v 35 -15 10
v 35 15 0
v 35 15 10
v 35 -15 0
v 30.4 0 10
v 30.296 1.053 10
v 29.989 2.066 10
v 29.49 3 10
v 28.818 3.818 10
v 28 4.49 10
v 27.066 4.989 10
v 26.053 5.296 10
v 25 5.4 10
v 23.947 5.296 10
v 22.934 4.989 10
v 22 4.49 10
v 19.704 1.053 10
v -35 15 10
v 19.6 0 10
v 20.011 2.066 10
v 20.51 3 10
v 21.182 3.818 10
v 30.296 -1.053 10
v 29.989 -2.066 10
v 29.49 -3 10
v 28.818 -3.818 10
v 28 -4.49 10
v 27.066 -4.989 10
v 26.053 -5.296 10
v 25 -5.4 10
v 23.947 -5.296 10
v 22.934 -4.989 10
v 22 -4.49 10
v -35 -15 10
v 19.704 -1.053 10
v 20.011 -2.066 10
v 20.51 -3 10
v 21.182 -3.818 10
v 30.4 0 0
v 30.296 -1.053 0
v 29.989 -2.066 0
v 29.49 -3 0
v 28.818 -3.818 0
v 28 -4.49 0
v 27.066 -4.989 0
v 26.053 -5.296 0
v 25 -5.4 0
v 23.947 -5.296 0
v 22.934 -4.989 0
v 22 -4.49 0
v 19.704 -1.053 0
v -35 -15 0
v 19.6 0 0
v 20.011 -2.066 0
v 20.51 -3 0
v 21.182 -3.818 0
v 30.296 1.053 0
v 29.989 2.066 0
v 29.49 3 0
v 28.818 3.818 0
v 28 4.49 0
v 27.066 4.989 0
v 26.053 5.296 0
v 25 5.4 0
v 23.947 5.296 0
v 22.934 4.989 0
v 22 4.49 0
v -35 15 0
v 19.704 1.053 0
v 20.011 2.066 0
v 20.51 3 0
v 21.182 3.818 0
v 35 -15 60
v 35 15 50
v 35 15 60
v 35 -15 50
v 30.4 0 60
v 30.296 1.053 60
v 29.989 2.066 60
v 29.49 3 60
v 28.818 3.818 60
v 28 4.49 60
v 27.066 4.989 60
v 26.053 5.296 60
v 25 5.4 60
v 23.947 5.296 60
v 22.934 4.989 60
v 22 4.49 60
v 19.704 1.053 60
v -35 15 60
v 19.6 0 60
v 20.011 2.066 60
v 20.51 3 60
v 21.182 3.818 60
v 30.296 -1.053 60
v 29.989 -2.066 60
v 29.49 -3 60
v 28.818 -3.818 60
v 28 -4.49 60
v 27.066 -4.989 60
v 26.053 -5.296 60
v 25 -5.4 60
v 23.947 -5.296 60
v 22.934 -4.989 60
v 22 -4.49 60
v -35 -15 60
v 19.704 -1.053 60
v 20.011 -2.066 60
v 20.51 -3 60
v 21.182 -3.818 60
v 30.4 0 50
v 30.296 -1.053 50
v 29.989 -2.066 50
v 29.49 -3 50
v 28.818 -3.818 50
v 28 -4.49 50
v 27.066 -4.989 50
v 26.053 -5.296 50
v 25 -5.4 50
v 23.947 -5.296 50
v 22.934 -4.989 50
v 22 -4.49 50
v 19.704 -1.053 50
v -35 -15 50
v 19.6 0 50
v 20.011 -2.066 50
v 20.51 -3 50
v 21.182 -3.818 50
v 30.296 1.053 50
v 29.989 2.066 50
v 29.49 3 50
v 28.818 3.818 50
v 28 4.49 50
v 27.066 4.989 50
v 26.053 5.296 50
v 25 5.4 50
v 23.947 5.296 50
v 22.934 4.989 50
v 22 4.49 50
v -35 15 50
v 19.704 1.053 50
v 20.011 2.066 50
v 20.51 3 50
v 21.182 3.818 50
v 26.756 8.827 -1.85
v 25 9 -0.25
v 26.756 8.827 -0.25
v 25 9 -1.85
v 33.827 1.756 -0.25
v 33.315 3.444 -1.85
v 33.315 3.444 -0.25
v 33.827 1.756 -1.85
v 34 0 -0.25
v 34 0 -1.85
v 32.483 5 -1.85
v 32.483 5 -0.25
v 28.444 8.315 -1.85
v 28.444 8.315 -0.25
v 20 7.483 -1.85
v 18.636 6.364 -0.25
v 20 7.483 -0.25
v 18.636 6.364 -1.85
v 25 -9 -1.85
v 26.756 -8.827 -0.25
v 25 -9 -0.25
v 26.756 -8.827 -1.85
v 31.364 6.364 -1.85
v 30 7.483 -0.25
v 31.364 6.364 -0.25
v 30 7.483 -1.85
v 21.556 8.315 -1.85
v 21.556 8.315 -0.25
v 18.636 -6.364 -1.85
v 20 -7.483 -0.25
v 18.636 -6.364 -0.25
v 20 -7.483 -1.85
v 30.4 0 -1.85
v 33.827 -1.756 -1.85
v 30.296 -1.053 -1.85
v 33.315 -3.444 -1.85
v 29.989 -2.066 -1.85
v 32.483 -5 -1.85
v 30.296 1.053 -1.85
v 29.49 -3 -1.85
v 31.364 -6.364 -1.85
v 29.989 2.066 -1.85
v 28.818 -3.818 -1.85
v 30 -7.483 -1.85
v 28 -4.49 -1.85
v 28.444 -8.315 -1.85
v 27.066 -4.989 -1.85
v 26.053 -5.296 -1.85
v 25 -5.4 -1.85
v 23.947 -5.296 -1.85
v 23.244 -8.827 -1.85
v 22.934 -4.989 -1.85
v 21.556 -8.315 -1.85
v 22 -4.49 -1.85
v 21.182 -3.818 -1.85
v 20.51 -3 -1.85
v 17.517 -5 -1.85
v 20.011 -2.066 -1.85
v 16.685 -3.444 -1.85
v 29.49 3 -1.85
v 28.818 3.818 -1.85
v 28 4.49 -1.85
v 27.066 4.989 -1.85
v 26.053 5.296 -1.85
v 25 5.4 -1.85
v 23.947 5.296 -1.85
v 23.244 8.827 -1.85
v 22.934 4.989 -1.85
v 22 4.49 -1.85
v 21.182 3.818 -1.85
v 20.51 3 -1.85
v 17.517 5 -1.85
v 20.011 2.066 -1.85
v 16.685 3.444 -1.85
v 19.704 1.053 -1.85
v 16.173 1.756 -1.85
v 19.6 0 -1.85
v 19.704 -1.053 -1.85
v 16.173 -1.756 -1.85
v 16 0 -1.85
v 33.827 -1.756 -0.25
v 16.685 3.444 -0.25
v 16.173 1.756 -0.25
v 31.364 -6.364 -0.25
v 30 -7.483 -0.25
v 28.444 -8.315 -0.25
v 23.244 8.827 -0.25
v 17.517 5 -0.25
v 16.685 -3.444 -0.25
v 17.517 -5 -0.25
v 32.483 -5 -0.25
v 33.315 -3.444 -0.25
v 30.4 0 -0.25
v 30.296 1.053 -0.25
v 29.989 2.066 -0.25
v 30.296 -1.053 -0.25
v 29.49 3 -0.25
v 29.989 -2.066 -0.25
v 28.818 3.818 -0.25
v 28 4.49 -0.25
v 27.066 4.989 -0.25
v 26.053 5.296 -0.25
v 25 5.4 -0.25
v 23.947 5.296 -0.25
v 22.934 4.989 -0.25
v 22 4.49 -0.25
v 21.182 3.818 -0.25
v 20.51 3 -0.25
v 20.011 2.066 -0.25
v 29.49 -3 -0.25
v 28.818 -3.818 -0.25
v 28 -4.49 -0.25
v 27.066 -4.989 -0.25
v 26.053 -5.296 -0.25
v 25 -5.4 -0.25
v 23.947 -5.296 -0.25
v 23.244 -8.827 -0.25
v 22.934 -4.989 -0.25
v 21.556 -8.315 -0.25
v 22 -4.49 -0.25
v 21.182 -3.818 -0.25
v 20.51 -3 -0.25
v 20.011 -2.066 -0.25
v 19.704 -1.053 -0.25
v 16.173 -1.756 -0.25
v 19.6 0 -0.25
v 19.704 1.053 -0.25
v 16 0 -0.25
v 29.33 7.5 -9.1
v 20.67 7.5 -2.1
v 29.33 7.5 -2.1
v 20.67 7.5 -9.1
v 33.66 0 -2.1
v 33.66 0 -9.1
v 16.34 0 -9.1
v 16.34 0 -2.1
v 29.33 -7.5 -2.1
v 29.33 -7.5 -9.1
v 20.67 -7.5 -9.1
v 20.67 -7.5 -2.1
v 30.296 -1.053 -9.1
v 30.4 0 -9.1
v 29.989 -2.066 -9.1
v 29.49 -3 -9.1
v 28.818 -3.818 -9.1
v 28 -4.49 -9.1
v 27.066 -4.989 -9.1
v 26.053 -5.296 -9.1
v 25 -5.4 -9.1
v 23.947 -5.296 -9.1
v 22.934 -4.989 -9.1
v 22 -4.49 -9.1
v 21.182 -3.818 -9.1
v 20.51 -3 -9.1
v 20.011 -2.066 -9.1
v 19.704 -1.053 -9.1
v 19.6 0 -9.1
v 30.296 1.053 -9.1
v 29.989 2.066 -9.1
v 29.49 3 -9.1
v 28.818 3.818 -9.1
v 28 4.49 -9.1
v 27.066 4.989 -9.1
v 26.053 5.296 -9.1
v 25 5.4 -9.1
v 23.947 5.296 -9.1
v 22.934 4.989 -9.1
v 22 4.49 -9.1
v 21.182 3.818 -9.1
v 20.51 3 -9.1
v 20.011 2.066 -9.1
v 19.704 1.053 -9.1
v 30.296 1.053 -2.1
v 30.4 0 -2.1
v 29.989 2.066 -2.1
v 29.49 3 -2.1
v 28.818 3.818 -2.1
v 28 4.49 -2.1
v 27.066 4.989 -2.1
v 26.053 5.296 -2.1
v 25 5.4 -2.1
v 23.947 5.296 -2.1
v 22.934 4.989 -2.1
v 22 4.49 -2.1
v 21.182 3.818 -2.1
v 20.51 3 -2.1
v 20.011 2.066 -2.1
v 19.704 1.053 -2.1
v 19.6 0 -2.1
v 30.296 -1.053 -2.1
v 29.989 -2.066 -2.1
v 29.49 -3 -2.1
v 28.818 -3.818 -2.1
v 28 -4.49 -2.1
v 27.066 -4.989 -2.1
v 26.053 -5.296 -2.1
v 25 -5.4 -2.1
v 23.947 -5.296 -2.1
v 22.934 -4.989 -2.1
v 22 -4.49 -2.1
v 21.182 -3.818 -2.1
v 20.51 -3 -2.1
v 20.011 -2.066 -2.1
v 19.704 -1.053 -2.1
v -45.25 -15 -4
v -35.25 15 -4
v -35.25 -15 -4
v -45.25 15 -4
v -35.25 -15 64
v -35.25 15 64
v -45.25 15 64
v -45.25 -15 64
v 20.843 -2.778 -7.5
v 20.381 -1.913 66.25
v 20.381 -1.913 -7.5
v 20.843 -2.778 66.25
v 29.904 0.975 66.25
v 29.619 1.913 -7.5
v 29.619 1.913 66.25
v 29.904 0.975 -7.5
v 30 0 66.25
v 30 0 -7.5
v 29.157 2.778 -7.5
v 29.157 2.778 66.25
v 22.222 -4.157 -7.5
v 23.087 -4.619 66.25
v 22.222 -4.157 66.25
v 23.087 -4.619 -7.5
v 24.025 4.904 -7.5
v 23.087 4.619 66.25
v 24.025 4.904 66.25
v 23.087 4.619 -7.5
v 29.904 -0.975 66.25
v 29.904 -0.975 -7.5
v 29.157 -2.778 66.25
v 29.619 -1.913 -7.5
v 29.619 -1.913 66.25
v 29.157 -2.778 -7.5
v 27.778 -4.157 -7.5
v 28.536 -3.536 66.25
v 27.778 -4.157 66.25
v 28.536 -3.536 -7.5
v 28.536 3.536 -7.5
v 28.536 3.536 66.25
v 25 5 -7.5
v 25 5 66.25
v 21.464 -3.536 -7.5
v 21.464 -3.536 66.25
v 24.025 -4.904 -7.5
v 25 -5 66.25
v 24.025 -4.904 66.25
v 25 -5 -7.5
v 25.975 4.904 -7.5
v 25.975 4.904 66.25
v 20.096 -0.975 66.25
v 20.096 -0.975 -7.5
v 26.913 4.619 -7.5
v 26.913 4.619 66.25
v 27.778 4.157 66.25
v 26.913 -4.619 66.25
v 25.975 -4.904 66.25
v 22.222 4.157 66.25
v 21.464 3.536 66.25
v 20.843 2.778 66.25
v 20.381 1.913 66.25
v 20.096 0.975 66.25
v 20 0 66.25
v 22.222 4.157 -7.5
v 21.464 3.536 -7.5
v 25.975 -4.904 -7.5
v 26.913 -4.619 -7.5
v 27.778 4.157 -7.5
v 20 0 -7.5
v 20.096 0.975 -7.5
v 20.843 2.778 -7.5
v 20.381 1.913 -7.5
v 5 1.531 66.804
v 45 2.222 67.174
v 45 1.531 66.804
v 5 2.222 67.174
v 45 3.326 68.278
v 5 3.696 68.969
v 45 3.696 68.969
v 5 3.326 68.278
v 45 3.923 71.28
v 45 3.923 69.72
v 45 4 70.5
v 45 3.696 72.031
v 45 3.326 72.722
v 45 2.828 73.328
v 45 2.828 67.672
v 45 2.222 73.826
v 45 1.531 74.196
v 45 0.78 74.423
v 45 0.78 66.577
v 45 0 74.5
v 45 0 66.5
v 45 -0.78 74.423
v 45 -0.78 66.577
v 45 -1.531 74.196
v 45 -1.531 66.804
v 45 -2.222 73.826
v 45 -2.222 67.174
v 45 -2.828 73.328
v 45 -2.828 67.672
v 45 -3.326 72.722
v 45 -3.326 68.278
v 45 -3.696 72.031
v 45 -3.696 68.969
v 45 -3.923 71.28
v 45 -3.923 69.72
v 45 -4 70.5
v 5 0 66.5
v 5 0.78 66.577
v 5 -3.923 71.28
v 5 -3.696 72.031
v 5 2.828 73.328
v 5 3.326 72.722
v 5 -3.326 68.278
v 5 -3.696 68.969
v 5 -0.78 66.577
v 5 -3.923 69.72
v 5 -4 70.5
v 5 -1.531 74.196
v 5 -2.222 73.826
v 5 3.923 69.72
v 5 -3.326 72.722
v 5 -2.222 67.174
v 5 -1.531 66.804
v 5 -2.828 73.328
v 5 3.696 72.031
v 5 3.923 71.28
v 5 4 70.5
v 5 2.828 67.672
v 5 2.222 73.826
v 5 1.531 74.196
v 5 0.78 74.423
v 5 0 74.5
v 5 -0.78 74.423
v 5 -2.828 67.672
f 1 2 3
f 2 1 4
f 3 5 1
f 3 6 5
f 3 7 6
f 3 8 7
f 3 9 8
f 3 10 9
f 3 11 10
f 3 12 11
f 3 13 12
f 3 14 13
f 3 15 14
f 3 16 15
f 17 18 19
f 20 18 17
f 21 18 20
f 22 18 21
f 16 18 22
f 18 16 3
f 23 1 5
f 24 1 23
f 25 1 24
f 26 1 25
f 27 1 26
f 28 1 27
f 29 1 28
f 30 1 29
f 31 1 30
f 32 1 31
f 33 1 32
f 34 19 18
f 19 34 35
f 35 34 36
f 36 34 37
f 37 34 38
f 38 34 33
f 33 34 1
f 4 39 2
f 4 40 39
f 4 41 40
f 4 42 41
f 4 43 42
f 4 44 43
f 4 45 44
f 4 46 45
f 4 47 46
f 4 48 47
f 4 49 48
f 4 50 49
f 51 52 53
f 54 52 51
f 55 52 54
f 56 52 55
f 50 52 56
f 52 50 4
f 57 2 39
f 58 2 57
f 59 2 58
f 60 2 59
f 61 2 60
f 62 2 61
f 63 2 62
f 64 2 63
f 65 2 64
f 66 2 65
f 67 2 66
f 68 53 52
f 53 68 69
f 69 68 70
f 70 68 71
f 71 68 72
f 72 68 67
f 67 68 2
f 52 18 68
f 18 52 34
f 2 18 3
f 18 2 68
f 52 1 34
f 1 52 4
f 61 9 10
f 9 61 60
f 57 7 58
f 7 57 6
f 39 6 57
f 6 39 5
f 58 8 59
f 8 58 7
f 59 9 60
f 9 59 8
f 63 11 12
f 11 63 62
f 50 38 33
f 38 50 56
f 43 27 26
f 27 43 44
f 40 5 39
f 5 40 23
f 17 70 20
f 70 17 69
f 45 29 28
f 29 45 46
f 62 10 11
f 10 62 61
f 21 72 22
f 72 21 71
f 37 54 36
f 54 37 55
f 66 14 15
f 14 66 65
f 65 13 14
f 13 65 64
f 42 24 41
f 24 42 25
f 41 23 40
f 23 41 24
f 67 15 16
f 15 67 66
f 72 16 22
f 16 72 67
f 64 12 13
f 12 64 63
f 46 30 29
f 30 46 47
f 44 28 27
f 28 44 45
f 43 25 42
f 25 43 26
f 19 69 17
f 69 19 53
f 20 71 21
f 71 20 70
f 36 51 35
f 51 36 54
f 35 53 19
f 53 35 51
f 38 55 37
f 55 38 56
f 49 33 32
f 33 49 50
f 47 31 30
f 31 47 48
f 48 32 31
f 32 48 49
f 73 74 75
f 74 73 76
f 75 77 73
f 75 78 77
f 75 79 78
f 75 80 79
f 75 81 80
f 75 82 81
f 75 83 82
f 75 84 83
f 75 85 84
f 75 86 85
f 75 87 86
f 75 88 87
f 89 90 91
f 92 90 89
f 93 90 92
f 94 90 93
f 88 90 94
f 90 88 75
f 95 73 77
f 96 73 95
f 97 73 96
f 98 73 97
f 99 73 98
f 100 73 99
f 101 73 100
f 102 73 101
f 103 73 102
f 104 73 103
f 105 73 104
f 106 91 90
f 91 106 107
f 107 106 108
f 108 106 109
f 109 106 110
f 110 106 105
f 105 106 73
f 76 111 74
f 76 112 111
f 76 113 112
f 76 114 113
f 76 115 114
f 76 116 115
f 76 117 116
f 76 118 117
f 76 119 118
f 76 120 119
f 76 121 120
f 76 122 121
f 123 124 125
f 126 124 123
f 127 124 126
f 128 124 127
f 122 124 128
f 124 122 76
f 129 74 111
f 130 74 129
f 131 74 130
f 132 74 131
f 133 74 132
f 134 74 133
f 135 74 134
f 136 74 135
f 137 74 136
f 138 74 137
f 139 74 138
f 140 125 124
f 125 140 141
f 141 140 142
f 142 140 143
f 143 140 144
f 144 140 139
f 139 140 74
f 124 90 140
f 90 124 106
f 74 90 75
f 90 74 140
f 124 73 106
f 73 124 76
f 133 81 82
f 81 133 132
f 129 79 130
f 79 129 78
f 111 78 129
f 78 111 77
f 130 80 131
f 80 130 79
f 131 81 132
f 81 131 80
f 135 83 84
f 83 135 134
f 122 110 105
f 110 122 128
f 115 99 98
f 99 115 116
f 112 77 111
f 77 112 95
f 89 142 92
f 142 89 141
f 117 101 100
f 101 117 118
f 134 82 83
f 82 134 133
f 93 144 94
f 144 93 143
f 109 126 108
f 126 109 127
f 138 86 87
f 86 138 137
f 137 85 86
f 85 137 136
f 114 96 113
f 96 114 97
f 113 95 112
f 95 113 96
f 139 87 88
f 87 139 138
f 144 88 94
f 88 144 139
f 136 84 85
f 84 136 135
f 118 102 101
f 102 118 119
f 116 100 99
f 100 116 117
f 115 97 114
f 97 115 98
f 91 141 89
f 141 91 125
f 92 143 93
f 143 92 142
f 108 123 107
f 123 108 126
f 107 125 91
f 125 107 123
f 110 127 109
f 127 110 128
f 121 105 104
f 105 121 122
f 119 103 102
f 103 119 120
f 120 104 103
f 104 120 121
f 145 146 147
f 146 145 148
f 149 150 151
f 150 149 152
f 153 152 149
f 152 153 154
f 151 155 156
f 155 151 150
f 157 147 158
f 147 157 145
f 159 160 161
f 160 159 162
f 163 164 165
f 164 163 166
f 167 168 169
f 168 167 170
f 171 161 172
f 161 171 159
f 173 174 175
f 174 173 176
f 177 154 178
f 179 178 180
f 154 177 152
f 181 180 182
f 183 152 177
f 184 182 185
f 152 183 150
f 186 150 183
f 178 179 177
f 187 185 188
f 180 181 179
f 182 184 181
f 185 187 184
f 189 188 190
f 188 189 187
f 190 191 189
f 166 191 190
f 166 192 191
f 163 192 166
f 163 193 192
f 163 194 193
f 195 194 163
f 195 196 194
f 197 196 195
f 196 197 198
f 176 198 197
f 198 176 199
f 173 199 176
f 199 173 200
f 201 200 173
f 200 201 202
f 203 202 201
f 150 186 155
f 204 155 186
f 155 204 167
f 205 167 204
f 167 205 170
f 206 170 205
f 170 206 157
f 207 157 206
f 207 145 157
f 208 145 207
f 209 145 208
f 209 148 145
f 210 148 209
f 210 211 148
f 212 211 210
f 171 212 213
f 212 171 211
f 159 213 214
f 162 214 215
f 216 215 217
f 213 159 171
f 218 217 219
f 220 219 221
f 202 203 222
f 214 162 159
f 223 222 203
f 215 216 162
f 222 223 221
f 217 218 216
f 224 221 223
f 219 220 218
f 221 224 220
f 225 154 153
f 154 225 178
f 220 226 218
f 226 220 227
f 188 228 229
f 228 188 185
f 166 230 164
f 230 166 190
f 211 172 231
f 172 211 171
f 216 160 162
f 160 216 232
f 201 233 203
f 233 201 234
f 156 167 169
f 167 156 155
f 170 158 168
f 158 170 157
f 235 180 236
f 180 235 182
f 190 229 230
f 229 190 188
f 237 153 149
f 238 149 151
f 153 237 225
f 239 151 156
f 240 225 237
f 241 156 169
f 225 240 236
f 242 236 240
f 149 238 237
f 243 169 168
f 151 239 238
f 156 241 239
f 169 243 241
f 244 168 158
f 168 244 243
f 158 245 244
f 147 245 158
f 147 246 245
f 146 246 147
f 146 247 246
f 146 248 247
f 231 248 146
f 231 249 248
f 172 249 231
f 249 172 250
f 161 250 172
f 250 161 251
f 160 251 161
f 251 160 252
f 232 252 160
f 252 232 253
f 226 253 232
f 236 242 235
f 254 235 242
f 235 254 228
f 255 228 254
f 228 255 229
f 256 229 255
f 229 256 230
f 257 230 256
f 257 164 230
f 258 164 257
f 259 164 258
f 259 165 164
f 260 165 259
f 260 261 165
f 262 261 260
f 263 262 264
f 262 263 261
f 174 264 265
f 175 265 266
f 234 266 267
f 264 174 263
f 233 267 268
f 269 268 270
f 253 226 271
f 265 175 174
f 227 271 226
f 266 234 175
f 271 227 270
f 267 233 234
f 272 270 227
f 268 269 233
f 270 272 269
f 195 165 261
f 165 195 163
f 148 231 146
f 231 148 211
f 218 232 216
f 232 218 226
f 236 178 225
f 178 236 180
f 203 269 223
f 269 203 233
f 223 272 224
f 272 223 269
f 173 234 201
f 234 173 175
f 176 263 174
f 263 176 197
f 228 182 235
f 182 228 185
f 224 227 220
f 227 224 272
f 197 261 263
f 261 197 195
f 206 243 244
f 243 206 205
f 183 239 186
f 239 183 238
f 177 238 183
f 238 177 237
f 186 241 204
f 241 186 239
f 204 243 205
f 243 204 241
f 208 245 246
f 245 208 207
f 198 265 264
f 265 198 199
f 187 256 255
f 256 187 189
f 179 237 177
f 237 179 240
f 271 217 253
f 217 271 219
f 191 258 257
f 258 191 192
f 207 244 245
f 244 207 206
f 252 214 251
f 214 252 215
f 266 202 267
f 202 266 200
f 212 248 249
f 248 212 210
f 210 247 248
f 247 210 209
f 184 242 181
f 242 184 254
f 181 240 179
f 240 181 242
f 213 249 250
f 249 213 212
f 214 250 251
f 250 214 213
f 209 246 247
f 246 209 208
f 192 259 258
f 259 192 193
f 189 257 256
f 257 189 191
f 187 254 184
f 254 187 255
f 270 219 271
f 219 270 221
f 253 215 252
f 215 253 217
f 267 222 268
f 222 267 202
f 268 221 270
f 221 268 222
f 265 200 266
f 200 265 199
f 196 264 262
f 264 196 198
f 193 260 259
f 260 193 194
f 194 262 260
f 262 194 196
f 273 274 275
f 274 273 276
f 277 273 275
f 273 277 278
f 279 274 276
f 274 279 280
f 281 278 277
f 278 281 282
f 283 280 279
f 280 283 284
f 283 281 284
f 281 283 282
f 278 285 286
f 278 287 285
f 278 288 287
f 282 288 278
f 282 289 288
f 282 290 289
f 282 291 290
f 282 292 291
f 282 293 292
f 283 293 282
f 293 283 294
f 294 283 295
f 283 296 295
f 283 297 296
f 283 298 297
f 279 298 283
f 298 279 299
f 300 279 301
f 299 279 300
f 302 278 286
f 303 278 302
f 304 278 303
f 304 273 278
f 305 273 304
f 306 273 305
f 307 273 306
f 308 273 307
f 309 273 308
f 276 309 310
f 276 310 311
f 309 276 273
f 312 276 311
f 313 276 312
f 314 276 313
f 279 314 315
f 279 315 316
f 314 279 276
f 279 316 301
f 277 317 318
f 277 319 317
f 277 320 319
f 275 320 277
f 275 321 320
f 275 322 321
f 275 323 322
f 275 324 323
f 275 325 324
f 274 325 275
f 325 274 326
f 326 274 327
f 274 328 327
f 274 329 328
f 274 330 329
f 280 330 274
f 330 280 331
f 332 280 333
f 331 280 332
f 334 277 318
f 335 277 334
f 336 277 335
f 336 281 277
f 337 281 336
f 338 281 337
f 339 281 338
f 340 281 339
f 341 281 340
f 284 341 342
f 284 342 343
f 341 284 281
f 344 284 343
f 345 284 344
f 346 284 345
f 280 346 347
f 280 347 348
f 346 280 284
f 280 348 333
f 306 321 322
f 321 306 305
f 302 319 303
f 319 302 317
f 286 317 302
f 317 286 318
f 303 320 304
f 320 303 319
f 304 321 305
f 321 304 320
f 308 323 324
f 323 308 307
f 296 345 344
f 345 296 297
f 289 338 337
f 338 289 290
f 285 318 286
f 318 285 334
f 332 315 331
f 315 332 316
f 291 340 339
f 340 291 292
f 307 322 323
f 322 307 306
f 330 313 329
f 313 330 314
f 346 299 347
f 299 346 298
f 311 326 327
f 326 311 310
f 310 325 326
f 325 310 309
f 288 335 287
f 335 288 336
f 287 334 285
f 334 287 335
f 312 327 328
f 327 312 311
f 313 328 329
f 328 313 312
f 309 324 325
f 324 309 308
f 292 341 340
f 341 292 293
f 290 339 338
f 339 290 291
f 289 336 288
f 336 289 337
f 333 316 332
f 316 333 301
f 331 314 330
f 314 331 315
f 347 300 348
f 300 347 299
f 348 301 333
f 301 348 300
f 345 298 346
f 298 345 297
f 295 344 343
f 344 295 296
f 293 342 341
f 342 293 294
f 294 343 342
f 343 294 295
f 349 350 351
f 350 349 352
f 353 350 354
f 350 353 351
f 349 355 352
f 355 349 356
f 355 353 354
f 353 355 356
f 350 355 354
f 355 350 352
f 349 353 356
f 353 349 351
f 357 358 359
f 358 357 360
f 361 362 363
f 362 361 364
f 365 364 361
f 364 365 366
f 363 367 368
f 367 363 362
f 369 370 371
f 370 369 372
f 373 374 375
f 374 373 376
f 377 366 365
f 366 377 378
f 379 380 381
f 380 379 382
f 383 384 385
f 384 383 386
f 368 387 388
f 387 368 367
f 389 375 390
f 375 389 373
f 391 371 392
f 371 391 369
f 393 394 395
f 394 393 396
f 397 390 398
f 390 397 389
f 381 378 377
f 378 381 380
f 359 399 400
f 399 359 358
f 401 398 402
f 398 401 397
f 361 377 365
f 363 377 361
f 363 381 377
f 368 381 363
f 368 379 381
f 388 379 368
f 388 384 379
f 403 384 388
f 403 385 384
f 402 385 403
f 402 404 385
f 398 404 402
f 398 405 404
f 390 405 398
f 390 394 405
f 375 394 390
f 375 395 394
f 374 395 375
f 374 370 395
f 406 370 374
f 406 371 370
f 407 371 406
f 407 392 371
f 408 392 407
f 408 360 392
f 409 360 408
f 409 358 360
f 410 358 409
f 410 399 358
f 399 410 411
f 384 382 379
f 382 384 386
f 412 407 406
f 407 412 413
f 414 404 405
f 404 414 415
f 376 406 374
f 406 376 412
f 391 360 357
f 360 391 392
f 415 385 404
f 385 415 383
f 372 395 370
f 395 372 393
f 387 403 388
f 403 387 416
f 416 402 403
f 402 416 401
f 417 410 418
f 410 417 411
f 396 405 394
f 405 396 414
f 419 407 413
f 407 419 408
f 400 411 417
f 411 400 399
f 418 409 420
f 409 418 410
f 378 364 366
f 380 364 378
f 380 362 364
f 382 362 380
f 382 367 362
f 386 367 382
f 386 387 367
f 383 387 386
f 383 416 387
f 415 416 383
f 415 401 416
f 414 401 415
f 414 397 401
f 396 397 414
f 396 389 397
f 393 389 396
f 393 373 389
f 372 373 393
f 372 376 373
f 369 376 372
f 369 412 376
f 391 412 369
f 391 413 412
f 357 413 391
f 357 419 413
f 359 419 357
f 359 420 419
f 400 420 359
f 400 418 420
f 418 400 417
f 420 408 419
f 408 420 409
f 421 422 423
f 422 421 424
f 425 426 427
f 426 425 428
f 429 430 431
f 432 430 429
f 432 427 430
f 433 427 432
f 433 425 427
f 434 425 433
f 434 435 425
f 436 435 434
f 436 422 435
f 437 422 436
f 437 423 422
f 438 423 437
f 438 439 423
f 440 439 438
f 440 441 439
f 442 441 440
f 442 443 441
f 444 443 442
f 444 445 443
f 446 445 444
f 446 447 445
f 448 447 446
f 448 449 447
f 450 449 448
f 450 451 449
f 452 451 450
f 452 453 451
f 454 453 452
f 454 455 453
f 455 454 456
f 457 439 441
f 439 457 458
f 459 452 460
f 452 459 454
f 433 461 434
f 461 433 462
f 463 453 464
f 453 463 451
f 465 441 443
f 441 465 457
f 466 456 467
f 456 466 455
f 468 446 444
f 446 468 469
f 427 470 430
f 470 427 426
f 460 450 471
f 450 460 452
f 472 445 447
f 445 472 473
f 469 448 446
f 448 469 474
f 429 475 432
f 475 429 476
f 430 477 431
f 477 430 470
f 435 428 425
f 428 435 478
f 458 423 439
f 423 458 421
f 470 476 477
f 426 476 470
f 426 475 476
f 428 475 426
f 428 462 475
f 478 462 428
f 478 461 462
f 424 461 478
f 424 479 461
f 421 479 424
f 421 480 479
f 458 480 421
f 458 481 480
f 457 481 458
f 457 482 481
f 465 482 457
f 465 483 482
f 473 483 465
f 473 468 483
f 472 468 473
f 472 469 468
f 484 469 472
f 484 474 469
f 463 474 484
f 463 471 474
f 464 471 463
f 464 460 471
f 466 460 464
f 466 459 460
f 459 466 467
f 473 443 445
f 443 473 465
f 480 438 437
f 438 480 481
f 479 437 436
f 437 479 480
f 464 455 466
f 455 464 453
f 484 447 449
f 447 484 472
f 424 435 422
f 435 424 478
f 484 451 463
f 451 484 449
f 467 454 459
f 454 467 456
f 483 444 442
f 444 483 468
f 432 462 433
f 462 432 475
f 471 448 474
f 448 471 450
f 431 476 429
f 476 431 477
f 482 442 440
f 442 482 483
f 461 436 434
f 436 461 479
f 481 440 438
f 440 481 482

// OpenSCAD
$fn = 32;

// ------------------------------------------------------------------------
// C clamp: throat 50 mm, screw d10
// Every part is its own module, assembly() places every instance.
// ------------------------------------------------------------------------

// --- part 1 ---
module clamp_arm() {
  difference() {
    translate([-35, -15, 0]) cube([70, 30, 10]);
    translate([25, 0, -1]) cylinder(h = 12, d = 10.8);
  }
}

// --- part 2 ---
module clamp_spine() {
  difference() {
    translate([-34, -15, 0]) cube([68, 30, 10]);
  }
}

// --- part 3 ---
module clamp_screw() {
  translate([0, 0, -36.875]) cylinder(h = 73.75, d = 10);
}

// --- part 4 ---
module clamp_washer() {
  difference() {
      translate([0, 0, 0]) cylinder(h = 1.6, d = 18);
      translate([0, 0, -1]) cylinder(h = 3.6, d = 10.8);
    }
}

// --- part 5 ---
module clamp_nut() {
  difference() {
    linear_extrude(height = 7) polygon(points = [[8.66, 0], [4.33, 7.5], [-4.33, 7.5], [-8.66, 0], [-4.33, -7.5], [4.33, -7.5]]);
    translate([0, 0, -1]) cylinder(h = 9, d = 10.8);
  }
}

// --- part 6 ---
module tommy_bar() {
  translate([0, 0, -20]) cylinder(h = 40, d = 8);
}

// --- assembly ---
module assembly() {
  color([0.80, 0.24, 0.20]) translate([0, 0, 0]) rotate([0, 0, 0]) clamp_arm();
  color([0.20, 0.45, 0.75]) translate([0, 0, 50]) rotate([0, 0, 0]) clamp_arm();
  color([0.25, 0.62, 0.32]) translate([-45.25, 0, 30]) rotate([0, 90, 0]) clamp_spine();
  color([0.92, 0.70, 0.18]) translate([25, 0, 29.375]) rotate([0, 0, 0]) clamp_screw();
  color([0.58, 0.35, 0.70]) translate([25, 0, -1.85]) rotate([0, 0, 0]) clamp_washer();
  color([0.16, 0.66, 0.66]) translate([25, 0, -9.1]) rotate([0, 0, 0]) clamp_nut();
  color([0.85, 0.48, 0.18]) translate([25, 0, 70.5]) rotate([0, 90, 0]) tommy_bar();
}

assembly();
